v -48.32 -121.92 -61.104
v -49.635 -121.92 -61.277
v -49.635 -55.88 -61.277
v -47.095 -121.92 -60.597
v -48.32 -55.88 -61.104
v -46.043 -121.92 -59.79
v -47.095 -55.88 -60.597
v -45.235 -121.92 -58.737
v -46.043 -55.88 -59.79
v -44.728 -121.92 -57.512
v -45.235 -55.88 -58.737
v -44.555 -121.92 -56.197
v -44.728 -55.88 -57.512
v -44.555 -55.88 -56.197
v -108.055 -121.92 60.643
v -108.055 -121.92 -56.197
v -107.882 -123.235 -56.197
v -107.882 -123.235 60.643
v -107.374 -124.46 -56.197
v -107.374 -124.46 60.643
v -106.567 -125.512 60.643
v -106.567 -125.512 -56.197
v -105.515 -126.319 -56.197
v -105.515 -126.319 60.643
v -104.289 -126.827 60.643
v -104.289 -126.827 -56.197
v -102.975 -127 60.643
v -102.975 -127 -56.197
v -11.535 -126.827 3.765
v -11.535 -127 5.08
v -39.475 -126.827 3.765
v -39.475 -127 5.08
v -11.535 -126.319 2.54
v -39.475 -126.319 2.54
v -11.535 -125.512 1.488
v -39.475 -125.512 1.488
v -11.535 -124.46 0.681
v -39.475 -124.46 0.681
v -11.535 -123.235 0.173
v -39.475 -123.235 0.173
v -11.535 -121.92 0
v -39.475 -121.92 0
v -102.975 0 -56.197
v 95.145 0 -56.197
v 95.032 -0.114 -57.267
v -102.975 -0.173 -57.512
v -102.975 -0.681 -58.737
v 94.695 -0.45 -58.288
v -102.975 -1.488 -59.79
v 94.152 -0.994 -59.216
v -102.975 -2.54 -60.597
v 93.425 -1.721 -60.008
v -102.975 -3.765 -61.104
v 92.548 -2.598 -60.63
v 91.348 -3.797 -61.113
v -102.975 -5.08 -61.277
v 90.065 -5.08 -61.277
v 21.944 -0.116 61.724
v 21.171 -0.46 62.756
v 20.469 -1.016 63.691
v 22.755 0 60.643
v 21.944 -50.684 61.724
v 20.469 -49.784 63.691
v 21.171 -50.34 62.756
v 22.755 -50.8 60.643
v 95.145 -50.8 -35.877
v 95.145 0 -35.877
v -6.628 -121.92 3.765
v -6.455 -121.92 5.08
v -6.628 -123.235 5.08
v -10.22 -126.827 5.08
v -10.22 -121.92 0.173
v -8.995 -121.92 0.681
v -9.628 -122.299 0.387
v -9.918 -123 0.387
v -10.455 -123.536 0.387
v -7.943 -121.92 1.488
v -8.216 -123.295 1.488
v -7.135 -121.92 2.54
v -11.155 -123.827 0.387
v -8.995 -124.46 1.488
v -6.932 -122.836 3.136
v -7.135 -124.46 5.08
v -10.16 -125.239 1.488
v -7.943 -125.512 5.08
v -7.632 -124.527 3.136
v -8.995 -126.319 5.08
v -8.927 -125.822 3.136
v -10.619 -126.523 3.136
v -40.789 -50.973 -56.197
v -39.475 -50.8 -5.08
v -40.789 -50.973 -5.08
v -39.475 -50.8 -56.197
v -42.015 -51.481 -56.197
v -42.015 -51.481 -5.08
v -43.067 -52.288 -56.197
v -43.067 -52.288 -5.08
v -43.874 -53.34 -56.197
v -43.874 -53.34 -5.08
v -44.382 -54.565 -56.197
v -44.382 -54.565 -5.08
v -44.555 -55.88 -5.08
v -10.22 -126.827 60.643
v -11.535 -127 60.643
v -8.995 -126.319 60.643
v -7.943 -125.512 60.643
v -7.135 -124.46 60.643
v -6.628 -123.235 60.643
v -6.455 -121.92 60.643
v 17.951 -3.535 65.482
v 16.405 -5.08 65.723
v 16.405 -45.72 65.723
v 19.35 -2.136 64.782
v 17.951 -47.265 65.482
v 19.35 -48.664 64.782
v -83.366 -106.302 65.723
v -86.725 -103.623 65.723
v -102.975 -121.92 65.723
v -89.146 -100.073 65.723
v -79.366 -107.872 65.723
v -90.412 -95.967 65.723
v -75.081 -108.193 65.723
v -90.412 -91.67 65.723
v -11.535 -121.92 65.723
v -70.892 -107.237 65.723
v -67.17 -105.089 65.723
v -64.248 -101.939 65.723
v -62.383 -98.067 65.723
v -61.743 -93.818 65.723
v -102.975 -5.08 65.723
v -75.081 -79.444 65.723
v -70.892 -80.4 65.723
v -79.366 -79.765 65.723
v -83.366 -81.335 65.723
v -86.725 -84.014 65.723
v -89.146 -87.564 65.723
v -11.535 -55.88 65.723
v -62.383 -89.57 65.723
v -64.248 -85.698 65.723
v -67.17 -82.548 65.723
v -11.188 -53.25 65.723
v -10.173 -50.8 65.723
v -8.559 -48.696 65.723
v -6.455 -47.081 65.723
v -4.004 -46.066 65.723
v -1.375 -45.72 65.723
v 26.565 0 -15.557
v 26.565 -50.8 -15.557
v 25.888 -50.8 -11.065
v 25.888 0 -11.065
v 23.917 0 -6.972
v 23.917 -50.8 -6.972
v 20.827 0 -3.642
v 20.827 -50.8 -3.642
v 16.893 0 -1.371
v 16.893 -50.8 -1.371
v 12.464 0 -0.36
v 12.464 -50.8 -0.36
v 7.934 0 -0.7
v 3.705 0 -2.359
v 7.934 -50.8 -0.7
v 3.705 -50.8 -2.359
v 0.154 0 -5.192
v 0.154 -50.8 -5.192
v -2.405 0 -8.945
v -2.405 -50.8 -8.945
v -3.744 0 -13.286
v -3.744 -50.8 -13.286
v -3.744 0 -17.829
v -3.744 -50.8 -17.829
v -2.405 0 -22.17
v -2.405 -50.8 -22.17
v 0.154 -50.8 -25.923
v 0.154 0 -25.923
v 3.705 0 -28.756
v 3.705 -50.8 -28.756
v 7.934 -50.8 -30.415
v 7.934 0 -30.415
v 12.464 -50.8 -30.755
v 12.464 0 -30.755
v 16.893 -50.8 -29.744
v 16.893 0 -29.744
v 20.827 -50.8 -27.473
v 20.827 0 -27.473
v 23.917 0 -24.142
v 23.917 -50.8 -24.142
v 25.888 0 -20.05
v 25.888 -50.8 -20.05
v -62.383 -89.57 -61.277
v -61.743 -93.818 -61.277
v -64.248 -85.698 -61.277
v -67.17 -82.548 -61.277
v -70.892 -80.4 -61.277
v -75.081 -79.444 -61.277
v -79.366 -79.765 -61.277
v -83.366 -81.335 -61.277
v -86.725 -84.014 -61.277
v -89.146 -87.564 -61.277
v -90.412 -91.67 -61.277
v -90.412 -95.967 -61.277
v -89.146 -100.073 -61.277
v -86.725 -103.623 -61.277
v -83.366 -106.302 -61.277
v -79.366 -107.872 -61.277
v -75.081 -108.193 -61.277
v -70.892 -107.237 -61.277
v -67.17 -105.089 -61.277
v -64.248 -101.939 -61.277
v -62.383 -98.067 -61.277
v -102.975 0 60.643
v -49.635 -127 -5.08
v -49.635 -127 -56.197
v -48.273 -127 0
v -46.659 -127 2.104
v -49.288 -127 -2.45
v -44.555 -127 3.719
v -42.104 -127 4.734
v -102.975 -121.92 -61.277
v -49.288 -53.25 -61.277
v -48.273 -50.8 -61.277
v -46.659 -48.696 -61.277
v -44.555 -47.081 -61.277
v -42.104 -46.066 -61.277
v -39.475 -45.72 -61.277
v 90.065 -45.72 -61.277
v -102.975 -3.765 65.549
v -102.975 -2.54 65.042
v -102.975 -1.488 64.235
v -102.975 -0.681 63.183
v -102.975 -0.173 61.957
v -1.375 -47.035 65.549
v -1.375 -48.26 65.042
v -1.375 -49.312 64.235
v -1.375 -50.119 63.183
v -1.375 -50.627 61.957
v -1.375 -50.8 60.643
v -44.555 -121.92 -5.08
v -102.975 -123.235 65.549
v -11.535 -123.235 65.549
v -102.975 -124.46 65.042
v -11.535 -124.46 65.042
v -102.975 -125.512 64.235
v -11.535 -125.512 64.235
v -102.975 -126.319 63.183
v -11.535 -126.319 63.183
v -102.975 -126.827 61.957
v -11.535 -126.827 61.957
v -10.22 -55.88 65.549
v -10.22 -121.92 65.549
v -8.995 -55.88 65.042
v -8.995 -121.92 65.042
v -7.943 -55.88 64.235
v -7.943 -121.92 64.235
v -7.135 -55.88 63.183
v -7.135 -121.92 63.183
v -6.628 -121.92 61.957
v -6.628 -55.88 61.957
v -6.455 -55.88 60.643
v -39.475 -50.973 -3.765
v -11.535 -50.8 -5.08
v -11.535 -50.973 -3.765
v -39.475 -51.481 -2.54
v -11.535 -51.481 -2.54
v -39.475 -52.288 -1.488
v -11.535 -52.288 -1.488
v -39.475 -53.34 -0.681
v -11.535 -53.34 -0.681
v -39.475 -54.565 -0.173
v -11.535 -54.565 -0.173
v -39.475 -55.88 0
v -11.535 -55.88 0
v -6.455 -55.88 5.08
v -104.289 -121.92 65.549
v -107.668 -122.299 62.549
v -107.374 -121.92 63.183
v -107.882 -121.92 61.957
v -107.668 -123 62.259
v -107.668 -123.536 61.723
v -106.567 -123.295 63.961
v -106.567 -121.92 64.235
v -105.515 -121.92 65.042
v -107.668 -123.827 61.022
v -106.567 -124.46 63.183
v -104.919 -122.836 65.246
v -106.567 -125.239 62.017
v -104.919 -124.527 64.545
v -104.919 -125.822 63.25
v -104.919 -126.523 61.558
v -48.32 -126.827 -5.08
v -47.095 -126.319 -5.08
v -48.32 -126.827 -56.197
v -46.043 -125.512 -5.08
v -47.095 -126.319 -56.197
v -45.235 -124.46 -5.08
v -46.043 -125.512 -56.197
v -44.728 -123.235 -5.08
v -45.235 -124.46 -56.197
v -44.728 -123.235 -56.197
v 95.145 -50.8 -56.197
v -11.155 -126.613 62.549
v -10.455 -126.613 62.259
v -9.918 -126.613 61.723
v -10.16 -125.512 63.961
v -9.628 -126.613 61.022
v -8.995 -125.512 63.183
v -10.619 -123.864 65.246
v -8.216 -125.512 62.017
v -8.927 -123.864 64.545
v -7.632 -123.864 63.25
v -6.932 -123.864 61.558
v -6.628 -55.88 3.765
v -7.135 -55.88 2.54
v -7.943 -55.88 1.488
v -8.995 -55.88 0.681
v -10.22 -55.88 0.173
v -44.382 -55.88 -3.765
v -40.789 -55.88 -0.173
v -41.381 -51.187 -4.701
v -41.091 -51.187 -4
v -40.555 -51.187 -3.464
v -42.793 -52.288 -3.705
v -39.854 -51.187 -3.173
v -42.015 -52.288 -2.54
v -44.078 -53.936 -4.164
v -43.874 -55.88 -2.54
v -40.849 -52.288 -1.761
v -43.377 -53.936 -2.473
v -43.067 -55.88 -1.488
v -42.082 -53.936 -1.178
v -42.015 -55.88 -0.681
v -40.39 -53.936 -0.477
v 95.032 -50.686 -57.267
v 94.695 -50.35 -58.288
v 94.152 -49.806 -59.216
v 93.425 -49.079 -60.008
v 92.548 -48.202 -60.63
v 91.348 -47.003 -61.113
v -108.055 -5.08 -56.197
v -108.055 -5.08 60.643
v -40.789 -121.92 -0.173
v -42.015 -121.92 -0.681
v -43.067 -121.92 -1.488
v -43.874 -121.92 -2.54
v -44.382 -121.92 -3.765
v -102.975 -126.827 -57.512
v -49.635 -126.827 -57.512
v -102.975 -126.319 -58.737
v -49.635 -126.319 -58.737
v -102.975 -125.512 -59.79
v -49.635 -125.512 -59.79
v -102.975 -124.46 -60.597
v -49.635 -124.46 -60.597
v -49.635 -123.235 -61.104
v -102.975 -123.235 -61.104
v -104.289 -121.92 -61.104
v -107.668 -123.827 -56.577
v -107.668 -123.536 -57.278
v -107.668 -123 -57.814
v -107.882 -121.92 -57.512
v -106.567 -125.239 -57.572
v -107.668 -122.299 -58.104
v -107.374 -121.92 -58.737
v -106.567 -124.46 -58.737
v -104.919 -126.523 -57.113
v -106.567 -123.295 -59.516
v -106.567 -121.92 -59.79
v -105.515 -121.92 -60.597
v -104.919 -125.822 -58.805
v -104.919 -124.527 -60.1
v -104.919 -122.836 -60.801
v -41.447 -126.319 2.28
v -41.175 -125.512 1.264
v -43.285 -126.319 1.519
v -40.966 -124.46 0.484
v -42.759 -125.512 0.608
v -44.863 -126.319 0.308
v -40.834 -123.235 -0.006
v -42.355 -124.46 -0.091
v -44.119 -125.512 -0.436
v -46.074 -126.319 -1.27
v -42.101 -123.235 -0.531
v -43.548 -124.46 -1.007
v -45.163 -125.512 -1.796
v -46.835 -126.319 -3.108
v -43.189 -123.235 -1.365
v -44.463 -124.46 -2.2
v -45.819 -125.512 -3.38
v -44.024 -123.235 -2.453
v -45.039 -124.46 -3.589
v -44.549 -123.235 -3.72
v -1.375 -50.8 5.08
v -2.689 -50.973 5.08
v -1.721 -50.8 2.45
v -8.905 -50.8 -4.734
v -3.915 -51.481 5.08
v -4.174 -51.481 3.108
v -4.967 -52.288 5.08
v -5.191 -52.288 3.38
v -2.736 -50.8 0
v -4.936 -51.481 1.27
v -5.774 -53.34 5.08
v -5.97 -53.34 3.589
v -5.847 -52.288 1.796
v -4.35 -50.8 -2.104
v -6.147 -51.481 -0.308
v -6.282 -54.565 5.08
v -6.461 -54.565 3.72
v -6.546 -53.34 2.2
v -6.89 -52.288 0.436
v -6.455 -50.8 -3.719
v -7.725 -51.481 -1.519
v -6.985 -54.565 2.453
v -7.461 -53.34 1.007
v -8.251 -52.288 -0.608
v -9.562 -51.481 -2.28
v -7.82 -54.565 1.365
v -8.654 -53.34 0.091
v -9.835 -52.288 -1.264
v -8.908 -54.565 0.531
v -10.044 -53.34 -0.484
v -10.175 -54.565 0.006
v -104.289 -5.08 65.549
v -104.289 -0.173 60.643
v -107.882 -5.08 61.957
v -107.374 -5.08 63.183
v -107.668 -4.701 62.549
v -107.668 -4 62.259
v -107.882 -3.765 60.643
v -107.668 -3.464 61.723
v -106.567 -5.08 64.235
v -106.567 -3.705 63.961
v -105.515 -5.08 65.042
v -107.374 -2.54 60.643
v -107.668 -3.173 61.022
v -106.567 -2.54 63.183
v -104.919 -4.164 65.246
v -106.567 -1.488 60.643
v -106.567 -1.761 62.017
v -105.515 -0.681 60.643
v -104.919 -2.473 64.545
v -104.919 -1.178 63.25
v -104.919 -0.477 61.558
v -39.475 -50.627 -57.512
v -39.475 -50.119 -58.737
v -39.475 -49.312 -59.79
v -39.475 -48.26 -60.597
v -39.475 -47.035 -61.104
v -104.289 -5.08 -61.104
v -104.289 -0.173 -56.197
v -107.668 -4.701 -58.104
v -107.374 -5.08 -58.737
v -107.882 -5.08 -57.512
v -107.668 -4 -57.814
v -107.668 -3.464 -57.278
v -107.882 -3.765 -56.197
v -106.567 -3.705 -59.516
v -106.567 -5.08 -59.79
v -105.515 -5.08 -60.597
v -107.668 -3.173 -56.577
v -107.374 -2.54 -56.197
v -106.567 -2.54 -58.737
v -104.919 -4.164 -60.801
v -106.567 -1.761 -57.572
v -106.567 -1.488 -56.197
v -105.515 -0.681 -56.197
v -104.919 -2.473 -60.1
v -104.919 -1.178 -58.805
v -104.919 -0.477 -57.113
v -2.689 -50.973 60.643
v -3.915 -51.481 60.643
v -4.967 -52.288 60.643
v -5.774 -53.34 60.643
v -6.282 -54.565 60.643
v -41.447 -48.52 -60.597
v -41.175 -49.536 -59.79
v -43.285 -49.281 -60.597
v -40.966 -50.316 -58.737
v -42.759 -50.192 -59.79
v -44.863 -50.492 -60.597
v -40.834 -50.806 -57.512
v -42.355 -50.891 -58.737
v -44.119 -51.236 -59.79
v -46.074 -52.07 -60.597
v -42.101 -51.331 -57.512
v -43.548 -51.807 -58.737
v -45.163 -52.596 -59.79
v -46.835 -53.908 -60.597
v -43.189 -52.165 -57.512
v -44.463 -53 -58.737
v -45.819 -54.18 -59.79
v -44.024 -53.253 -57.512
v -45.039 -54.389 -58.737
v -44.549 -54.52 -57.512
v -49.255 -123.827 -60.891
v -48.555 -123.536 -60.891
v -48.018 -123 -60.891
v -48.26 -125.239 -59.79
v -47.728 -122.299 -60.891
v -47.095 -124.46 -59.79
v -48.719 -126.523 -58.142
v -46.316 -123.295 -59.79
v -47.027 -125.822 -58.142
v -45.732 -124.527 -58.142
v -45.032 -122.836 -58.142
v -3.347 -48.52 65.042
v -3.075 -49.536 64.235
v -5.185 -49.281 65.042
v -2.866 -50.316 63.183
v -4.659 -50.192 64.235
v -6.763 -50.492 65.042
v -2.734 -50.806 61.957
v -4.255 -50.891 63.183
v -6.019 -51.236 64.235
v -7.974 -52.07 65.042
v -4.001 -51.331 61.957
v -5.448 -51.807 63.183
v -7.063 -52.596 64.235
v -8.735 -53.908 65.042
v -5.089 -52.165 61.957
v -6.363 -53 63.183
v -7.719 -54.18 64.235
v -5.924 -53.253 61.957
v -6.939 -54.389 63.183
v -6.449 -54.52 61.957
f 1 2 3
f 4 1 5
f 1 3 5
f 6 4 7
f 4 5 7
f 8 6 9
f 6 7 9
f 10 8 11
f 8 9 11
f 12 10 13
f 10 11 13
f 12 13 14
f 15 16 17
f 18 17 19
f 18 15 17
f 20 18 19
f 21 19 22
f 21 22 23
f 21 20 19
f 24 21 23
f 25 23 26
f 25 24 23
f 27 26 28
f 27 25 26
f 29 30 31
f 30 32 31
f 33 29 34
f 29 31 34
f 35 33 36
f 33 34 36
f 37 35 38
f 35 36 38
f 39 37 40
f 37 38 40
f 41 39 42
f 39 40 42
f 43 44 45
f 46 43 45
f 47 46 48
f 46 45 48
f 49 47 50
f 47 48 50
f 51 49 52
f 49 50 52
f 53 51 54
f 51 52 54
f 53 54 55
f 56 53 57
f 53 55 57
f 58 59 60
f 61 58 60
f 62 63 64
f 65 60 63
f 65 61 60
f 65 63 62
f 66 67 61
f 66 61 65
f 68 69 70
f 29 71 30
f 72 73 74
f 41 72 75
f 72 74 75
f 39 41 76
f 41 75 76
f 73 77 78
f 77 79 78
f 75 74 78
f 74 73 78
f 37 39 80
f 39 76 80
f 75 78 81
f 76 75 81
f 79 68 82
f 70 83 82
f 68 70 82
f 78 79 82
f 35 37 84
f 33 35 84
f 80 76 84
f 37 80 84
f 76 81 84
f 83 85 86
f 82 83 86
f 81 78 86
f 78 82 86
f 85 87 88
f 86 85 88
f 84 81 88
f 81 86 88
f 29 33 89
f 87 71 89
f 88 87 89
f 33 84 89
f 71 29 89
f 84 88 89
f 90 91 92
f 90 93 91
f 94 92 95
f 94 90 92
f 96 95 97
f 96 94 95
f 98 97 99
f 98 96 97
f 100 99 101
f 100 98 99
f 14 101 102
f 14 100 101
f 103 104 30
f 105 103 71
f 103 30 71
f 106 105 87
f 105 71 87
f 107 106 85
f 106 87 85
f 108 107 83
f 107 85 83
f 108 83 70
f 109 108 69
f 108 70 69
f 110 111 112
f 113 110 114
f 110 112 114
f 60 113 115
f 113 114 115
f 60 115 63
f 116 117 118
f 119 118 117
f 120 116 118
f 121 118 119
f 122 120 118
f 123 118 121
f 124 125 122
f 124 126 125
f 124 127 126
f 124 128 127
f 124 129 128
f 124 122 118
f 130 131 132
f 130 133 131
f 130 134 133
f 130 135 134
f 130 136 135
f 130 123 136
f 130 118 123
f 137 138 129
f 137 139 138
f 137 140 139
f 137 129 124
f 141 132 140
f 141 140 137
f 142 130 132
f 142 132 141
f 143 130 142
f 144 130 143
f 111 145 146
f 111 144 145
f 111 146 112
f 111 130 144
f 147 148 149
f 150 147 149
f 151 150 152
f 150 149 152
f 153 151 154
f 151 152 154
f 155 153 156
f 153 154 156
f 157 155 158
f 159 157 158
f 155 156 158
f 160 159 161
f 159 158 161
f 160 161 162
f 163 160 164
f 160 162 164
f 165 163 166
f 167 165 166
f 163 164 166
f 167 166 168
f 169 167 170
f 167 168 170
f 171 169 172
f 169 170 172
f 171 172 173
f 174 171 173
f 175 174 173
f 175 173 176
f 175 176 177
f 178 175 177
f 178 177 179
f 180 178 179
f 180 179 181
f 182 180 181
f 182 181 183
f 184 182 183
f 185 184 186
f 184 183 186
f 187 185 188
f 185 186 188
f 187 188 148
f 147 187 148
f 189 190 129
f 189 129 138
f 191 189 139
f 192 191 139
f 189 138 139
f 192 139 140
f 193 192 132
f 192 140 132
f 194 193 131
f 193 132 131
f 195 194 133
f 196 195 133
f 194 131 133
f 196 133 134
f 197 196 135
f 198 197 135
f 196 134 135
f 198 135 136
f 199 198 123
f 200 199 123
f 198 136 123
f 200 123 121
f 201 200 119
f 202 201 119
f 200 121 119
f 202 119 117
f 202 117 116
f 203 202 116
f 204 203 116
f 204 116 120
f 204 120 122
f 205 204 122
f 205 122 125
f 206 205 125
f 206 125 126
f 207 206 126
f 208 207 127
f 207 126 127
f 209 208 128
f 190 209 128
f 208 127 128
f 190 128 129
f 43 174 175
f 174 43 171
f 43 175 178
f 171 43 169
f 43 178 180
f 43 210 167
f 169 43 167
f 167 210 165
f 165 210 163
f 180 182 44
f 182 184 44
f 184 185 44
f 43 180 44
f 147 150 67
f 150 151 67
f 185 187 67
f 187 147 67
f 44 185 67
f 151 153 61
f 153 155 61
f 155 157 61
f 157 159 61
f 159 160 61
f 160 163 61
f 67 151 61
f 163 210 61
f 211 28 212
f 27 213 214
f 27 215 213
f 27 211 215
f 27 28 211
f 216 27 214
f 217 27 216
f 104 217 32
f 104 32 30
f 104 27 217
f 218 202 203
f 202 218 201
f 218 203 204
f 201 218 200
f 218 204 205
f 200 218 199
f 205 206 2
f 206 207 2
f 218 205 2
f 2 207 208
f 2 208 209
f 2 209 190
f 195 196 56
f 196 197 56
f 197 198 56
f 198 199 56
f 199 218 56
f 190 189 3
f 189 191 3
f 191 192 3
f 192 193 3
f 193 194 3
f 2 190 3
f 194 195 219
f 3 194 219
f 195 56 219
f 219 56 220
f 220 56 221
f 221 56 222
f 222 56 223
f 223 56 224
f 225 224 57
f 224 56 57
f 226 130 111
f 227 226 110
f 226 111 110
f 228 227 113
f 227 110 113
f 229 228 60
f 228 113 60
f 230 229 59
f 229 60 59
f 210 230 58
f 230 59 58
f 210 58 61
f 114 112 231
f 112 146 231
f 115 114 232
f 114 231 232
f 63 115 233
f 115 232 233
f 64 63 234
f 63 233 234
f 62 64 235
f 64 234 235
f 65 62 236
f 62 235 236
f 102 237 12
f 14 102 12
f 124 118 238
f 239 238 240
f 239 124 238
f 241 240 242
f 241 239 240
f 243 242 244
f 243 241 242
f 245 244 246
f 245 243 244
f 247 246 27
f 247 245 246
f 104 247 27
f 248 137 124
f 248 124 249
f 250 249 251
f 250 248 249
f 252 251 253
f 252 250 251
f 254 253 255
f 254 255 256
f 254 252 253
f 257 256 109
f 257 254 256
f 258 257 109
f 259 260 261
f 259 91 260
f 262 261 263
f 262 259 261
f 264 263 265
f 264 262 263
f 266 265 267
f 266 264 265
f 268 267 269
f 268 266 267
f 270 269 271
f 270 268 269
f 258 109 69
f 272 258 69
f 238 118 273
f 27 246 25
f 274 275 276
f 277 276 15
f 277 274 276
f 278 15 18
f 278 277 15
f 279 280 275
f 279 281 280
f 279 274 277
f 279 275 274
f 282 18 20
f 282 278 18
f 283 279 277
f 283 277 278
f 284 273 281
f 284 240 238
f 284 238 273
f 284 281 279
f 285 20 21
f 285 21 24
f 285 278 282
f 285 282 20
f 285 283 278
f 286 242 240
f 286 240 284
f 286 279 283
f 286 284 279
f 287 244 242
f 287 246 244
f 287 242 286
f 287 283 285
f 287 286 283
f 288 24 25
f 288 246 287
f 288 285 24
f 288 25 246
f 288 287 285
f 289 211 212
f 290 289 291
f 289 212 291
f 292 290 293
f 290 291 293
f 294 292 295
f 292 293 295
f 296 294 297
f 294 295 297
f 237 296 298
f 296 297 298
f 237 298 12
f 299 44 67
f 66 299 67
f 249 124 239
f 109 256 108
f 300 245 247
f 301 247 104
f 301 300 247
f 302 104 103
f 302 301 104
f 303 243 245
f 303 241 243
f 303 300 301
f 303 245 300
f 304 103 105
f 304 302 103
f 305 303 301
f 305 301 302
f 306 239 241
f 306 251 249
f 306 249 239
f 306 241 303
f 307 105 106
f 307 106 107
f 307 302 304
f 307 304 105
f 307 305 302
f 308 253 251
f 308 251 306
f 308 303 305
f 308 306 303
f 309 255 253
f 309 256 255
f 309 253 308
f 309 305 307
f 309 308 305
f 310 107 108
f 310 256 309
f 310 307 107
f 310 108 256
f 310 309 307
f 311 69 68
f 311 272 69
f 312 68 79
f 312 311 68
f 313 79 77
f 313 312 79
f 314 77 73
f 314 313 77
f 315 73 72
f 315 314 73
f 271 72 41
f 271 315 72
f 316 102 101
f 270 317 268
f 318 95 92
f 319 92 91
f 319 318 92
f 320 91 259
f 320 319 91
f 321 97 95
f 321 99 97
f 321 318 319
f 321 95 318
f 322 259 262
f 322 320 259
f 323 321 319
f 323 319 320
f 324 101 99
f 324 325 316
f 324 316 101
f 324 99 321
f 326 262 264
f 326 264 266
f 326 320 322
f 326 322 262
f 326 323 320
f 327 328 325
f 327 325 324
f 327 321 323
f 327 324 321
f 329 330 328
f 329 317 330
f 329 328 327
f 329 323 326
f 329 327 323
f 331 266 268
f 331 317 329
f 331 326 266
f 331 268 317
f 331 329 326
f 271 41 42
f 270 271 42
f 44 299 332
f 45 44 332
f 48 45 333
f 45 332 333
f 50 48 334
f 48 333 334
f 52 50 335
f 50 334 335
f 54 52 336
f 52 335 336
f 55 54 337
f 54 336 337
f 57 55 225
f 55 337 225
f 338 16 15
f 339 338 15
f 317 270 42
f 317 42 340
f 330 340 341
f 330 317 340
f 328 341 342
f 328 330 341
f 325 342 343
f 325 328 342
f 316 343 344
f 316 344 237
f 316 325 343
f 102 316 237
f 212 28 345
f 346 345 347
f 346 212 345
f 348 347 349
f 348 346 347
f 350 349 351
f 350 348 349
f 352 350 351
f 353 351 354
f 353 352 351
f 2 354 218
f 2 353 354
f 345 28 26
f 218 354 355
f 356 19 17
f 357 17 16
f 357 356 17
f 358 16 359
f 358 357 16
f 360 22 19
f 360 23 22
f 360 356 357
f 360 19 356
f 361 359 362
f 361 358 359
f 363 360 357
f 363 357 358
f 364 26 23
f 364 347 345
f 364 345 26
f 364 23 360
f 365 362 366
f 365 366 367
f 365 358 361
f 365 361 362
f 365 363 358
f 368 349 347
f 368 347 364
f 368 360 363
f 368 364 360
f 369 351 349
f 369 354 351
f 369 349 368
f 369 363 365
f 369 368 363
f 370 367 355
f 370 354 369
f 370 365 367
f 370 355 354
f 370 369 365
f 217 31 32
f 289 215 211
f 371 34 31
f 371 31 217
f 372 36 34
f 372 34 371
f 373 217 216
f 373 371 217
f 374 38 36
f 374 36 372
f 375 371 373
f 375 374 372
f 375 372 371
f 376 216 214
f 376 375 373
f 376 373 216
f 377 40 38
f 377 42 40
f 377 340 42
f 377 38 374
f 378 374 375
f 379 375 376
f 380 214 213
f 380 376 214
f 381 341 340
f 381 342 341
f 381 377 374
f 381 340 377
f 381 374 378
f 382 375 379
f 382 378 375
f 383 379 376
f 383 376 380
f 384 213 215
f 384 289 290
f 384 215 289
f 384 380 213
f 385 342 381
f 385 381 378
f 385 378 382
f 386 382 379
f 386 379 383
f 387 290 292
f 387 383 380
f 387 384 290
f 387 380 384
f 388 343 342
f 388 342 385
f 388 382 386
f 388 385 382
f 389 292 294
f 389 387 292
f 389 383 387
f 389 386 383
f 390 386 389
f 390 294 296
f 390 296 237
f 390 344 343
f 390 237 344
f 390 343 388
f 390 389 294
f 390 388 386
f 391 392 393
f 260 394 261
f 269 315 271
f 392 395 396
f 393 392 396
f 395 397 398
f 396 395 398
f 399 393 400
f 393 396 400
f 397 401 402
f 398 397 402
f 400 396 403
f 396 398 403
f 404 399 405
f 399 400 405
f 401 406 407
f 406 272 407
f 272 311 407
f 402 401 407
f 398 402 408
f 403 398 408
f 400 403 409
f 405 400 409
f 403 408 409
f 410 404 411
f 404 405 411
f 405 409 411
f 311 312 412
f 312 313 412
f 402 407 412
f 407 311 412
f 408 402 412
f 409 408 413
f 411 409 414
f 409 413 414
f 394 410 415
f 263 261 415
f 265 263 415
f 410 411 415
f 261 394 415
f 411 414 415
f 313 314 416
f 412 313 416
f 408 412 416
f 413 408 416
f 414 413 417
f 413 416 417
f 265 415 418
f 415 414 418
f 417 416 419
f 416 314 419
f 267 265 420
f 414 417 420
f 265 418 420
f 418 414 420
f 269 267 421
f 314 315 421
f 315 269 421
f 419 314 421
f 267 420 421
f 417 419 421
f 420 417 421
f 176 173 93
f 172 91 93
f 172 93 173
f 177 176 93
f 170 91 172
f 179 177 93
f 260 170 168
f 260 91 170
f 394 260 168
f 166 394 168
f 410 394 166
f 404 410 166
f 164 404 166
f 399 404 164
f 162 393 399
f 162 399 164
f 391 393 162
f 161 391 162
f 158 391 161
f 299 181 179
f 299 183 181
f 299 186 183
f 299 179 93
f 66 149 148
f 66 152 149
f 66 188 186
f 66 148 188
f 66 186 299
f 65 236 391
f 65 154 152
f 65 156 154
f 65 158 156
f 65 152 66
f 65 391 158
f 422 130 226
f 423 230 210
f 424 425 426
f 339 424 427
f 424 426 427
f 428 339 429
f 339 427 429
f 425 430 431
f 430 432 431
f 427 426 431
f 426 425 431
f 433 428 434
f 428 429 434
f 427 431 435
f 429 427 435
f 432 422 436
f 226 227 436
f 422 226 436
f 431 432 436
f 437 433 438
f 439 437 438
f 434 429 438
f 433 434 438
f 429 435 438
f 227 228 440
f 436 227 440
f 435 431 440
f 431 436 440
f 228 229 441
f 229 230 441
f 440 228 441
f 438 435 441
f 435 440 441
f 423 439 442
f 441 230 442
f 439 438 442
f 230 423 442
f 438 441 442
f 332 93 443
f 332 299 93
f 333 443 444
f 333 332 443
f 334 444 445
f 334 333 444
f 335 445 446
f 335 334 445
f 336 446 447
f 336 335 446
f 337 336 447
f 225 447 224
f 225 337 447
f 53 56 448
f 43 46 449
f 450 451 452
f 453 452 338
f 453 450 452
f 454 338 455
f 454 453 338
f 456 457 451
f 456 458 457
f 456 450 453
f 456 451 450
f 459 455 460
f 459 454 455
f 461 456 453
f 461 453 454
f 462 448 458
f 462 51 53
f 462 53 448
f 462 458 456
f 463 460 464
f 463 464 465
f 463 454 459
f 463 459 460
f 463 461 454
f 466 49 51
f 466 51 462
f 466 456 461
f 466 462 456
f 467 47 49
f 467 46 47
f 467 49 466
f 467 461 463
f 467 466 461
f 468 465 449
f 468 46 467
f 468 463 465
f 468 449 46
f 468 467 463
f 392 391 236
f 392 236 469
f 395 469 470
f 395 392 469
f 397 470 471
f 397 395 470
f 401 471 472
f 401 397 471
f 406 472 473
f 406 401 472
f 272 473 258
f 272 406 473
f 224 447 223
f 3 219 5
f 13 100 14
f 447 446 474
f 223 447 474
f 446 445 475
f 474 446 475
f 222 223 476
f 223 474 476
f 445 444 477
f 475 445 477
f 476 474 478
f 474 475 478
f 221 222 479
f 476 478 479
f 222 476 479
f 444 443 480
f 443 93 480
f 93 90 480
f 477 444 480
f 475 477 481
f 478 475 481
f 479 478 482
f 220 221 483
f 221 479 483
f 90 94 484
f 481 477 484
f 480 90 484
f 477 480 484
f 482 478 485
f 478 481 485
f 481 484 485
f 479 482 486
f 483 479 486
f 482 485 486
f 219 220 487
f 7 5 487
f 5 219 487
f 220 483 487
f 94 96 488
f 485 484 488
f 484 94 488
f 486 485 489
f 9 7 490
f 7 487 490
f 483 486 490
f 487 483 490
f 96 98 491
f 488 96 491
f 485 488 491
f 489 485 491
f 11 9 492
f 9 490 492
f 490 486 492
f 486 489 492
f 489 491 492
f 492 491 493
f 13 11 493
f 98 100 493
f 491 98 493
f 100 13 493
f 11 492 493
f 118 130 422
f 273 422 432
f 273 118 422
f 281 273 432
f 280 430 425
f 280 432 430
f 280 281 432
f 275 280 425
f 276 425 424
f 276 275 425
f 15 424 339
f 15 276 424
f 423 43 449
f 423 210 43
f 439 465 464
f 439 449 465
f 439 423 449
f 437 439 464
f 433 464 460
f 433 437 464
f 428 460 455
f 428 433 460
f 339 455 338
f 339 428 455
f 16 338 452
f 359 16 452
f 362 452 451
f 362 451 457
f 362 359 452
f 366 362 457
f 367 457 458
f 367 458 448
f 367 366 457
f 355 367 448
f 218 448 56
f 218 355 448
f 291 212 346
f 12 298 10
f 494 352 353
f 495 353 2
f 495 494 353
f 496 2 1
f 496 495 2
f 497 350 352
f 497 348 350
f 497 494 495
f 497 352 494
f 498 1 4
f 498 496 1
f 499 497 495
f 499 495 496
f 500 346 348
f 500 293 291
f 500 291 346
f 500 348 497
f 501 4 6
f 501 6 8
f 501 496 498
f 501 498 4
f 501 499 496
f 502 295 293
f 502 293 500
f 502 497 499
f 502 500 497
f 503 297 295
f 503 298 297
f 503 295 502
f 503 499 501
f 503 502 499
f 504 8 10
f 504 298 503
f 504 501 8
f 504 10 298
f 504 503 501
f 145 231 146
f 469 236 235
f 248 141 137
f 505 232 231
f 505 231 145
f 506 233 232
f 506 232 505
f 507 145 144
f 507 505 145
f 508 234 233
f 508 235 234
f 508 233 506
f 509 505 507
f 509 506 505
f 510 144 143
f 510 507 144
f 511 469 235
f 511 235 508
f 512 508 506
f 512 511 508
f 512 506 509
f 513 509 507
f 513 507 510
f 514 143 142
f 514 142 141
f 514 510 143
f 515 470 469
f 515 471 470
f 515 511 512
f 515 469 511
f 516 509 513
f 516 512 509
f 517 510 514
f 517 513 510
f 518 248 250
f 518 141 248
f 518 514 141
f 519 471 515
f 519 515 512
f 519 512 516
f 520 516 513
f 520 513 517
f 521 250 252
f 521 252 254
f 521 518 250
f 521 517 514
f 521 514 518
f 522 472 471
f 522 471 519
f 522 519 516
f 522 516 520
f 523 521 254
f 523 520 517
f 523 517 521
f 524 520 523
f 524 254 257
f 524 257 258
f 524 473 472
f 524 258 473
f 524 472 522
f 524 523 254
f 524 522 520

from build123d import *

# Parameters (mm, degrees)
F0_W     = 203.2
F0_H     = 127
F1_DEPTH = 127
F3_DEPTH = 76.2
F4_SIZE2 = 101.6
F4_SIZE  = 76.2
F5_R     = 5.08
F6_R     = 15.24
F7_DEPTH = 50.8
F8_R     = 14.4150748184
F9_DEPTH = 127


with BuildPart() as f1:
    # F0 (on Front) → F1 (new body)
    with BuildSketch(Plane.XZ):
        with Locations((-6.4546563804, 2.2225044668)):
            Rectangle(F0_W, F0_H)
    extrude(amount=F1_DEPTH)

    # F2 (on face) → F3 (cut)
    with BuildSketch(Plane.XZ.offset(127)):
        Polygon((95.1453436196, 65.7225044668), (-6.4546563804, 65.7225044668), (-6.4546563804, 0), (-44.5546563804, 0), (-44.5546563804, -61.2774955332), (95.1453436196, -61.2774955332), align=None)
    extrude(amount=-F3_DEPTH, mode=Mode.SUBTRACT)

    # F4
    f4_edges = [f1.edges().sort_by_distance(p)[0] for p in [
        (95.145344, -25.4, 65.722504),
    ]]
    f4_side = f1.faces().sort_by_distance((-28.226085, -52.614286, 65.722504))[0]
    chamfer(f4_edges, length=F4_SIZE, length2=F4_SIZE2, reference=f4_side)

    # F5
    f5_edges = [f1.edges().sort_by_distance(p)[0] for p in [
        (-6.454656, -88.9, 65.722504),
        (-57.254656, -127, 65.722504),
        (-6.454656, -127, 32.861252),
        (-6.454656, -88.9, 0),
        (-6.454656, -50.8, 32.861252),
        (18.945344, -25.4, 65.722504),
        (-44.554656, 0, 65.722504),
        (-108.054656, -63.5, 65.722504),
        (6.245344, -50.8, 65.722504),
        (-25.504656, -127, 0),
        (-44.554656, -127, -30.638748),
        (-76.304656, -127, -61.277496),
        (-108.054656, -127, 2.222504),
        (-44.554656, -88.9, 0),
        (-44.554656, -88.9, -61.277496),
        (-44.554656, -50.8, -30.638748),
        (-6.454656, 0, -61.277496),
        (95.145344, -25.4, -61.277496),
        (25.295344, -50.8, -61.277496),
        (-108.054656, -63.5, -61.277496),
        (-108.054656, 0, 2.222504),
        (-25.504656, -50.8, 0),
    ]]
    fillet(f5_edges, radius=F5_R)

    # F6 (on face) → F7 (cut, through all)
    with BuildSketch(Plane.XZ.offset(50.8)):
        with Locations((11.3253436196, -15.5574955332)):
            Circle(F6_R)
    extrude(amount=-F7_DEPTH, mode=Mode.SUBTRACT)

    # F8 (on face) → F9 (cut, through all)
    with BuildSketch(Plane.XY.offset(65.7225044668)):
        with Locations((-76.158054173, -93.8184931874)):
            Circle(F8_R)
    extrude(amount=-F9_DEPTH, mode=Mode.SUBTRACT)


solid = f1.part
